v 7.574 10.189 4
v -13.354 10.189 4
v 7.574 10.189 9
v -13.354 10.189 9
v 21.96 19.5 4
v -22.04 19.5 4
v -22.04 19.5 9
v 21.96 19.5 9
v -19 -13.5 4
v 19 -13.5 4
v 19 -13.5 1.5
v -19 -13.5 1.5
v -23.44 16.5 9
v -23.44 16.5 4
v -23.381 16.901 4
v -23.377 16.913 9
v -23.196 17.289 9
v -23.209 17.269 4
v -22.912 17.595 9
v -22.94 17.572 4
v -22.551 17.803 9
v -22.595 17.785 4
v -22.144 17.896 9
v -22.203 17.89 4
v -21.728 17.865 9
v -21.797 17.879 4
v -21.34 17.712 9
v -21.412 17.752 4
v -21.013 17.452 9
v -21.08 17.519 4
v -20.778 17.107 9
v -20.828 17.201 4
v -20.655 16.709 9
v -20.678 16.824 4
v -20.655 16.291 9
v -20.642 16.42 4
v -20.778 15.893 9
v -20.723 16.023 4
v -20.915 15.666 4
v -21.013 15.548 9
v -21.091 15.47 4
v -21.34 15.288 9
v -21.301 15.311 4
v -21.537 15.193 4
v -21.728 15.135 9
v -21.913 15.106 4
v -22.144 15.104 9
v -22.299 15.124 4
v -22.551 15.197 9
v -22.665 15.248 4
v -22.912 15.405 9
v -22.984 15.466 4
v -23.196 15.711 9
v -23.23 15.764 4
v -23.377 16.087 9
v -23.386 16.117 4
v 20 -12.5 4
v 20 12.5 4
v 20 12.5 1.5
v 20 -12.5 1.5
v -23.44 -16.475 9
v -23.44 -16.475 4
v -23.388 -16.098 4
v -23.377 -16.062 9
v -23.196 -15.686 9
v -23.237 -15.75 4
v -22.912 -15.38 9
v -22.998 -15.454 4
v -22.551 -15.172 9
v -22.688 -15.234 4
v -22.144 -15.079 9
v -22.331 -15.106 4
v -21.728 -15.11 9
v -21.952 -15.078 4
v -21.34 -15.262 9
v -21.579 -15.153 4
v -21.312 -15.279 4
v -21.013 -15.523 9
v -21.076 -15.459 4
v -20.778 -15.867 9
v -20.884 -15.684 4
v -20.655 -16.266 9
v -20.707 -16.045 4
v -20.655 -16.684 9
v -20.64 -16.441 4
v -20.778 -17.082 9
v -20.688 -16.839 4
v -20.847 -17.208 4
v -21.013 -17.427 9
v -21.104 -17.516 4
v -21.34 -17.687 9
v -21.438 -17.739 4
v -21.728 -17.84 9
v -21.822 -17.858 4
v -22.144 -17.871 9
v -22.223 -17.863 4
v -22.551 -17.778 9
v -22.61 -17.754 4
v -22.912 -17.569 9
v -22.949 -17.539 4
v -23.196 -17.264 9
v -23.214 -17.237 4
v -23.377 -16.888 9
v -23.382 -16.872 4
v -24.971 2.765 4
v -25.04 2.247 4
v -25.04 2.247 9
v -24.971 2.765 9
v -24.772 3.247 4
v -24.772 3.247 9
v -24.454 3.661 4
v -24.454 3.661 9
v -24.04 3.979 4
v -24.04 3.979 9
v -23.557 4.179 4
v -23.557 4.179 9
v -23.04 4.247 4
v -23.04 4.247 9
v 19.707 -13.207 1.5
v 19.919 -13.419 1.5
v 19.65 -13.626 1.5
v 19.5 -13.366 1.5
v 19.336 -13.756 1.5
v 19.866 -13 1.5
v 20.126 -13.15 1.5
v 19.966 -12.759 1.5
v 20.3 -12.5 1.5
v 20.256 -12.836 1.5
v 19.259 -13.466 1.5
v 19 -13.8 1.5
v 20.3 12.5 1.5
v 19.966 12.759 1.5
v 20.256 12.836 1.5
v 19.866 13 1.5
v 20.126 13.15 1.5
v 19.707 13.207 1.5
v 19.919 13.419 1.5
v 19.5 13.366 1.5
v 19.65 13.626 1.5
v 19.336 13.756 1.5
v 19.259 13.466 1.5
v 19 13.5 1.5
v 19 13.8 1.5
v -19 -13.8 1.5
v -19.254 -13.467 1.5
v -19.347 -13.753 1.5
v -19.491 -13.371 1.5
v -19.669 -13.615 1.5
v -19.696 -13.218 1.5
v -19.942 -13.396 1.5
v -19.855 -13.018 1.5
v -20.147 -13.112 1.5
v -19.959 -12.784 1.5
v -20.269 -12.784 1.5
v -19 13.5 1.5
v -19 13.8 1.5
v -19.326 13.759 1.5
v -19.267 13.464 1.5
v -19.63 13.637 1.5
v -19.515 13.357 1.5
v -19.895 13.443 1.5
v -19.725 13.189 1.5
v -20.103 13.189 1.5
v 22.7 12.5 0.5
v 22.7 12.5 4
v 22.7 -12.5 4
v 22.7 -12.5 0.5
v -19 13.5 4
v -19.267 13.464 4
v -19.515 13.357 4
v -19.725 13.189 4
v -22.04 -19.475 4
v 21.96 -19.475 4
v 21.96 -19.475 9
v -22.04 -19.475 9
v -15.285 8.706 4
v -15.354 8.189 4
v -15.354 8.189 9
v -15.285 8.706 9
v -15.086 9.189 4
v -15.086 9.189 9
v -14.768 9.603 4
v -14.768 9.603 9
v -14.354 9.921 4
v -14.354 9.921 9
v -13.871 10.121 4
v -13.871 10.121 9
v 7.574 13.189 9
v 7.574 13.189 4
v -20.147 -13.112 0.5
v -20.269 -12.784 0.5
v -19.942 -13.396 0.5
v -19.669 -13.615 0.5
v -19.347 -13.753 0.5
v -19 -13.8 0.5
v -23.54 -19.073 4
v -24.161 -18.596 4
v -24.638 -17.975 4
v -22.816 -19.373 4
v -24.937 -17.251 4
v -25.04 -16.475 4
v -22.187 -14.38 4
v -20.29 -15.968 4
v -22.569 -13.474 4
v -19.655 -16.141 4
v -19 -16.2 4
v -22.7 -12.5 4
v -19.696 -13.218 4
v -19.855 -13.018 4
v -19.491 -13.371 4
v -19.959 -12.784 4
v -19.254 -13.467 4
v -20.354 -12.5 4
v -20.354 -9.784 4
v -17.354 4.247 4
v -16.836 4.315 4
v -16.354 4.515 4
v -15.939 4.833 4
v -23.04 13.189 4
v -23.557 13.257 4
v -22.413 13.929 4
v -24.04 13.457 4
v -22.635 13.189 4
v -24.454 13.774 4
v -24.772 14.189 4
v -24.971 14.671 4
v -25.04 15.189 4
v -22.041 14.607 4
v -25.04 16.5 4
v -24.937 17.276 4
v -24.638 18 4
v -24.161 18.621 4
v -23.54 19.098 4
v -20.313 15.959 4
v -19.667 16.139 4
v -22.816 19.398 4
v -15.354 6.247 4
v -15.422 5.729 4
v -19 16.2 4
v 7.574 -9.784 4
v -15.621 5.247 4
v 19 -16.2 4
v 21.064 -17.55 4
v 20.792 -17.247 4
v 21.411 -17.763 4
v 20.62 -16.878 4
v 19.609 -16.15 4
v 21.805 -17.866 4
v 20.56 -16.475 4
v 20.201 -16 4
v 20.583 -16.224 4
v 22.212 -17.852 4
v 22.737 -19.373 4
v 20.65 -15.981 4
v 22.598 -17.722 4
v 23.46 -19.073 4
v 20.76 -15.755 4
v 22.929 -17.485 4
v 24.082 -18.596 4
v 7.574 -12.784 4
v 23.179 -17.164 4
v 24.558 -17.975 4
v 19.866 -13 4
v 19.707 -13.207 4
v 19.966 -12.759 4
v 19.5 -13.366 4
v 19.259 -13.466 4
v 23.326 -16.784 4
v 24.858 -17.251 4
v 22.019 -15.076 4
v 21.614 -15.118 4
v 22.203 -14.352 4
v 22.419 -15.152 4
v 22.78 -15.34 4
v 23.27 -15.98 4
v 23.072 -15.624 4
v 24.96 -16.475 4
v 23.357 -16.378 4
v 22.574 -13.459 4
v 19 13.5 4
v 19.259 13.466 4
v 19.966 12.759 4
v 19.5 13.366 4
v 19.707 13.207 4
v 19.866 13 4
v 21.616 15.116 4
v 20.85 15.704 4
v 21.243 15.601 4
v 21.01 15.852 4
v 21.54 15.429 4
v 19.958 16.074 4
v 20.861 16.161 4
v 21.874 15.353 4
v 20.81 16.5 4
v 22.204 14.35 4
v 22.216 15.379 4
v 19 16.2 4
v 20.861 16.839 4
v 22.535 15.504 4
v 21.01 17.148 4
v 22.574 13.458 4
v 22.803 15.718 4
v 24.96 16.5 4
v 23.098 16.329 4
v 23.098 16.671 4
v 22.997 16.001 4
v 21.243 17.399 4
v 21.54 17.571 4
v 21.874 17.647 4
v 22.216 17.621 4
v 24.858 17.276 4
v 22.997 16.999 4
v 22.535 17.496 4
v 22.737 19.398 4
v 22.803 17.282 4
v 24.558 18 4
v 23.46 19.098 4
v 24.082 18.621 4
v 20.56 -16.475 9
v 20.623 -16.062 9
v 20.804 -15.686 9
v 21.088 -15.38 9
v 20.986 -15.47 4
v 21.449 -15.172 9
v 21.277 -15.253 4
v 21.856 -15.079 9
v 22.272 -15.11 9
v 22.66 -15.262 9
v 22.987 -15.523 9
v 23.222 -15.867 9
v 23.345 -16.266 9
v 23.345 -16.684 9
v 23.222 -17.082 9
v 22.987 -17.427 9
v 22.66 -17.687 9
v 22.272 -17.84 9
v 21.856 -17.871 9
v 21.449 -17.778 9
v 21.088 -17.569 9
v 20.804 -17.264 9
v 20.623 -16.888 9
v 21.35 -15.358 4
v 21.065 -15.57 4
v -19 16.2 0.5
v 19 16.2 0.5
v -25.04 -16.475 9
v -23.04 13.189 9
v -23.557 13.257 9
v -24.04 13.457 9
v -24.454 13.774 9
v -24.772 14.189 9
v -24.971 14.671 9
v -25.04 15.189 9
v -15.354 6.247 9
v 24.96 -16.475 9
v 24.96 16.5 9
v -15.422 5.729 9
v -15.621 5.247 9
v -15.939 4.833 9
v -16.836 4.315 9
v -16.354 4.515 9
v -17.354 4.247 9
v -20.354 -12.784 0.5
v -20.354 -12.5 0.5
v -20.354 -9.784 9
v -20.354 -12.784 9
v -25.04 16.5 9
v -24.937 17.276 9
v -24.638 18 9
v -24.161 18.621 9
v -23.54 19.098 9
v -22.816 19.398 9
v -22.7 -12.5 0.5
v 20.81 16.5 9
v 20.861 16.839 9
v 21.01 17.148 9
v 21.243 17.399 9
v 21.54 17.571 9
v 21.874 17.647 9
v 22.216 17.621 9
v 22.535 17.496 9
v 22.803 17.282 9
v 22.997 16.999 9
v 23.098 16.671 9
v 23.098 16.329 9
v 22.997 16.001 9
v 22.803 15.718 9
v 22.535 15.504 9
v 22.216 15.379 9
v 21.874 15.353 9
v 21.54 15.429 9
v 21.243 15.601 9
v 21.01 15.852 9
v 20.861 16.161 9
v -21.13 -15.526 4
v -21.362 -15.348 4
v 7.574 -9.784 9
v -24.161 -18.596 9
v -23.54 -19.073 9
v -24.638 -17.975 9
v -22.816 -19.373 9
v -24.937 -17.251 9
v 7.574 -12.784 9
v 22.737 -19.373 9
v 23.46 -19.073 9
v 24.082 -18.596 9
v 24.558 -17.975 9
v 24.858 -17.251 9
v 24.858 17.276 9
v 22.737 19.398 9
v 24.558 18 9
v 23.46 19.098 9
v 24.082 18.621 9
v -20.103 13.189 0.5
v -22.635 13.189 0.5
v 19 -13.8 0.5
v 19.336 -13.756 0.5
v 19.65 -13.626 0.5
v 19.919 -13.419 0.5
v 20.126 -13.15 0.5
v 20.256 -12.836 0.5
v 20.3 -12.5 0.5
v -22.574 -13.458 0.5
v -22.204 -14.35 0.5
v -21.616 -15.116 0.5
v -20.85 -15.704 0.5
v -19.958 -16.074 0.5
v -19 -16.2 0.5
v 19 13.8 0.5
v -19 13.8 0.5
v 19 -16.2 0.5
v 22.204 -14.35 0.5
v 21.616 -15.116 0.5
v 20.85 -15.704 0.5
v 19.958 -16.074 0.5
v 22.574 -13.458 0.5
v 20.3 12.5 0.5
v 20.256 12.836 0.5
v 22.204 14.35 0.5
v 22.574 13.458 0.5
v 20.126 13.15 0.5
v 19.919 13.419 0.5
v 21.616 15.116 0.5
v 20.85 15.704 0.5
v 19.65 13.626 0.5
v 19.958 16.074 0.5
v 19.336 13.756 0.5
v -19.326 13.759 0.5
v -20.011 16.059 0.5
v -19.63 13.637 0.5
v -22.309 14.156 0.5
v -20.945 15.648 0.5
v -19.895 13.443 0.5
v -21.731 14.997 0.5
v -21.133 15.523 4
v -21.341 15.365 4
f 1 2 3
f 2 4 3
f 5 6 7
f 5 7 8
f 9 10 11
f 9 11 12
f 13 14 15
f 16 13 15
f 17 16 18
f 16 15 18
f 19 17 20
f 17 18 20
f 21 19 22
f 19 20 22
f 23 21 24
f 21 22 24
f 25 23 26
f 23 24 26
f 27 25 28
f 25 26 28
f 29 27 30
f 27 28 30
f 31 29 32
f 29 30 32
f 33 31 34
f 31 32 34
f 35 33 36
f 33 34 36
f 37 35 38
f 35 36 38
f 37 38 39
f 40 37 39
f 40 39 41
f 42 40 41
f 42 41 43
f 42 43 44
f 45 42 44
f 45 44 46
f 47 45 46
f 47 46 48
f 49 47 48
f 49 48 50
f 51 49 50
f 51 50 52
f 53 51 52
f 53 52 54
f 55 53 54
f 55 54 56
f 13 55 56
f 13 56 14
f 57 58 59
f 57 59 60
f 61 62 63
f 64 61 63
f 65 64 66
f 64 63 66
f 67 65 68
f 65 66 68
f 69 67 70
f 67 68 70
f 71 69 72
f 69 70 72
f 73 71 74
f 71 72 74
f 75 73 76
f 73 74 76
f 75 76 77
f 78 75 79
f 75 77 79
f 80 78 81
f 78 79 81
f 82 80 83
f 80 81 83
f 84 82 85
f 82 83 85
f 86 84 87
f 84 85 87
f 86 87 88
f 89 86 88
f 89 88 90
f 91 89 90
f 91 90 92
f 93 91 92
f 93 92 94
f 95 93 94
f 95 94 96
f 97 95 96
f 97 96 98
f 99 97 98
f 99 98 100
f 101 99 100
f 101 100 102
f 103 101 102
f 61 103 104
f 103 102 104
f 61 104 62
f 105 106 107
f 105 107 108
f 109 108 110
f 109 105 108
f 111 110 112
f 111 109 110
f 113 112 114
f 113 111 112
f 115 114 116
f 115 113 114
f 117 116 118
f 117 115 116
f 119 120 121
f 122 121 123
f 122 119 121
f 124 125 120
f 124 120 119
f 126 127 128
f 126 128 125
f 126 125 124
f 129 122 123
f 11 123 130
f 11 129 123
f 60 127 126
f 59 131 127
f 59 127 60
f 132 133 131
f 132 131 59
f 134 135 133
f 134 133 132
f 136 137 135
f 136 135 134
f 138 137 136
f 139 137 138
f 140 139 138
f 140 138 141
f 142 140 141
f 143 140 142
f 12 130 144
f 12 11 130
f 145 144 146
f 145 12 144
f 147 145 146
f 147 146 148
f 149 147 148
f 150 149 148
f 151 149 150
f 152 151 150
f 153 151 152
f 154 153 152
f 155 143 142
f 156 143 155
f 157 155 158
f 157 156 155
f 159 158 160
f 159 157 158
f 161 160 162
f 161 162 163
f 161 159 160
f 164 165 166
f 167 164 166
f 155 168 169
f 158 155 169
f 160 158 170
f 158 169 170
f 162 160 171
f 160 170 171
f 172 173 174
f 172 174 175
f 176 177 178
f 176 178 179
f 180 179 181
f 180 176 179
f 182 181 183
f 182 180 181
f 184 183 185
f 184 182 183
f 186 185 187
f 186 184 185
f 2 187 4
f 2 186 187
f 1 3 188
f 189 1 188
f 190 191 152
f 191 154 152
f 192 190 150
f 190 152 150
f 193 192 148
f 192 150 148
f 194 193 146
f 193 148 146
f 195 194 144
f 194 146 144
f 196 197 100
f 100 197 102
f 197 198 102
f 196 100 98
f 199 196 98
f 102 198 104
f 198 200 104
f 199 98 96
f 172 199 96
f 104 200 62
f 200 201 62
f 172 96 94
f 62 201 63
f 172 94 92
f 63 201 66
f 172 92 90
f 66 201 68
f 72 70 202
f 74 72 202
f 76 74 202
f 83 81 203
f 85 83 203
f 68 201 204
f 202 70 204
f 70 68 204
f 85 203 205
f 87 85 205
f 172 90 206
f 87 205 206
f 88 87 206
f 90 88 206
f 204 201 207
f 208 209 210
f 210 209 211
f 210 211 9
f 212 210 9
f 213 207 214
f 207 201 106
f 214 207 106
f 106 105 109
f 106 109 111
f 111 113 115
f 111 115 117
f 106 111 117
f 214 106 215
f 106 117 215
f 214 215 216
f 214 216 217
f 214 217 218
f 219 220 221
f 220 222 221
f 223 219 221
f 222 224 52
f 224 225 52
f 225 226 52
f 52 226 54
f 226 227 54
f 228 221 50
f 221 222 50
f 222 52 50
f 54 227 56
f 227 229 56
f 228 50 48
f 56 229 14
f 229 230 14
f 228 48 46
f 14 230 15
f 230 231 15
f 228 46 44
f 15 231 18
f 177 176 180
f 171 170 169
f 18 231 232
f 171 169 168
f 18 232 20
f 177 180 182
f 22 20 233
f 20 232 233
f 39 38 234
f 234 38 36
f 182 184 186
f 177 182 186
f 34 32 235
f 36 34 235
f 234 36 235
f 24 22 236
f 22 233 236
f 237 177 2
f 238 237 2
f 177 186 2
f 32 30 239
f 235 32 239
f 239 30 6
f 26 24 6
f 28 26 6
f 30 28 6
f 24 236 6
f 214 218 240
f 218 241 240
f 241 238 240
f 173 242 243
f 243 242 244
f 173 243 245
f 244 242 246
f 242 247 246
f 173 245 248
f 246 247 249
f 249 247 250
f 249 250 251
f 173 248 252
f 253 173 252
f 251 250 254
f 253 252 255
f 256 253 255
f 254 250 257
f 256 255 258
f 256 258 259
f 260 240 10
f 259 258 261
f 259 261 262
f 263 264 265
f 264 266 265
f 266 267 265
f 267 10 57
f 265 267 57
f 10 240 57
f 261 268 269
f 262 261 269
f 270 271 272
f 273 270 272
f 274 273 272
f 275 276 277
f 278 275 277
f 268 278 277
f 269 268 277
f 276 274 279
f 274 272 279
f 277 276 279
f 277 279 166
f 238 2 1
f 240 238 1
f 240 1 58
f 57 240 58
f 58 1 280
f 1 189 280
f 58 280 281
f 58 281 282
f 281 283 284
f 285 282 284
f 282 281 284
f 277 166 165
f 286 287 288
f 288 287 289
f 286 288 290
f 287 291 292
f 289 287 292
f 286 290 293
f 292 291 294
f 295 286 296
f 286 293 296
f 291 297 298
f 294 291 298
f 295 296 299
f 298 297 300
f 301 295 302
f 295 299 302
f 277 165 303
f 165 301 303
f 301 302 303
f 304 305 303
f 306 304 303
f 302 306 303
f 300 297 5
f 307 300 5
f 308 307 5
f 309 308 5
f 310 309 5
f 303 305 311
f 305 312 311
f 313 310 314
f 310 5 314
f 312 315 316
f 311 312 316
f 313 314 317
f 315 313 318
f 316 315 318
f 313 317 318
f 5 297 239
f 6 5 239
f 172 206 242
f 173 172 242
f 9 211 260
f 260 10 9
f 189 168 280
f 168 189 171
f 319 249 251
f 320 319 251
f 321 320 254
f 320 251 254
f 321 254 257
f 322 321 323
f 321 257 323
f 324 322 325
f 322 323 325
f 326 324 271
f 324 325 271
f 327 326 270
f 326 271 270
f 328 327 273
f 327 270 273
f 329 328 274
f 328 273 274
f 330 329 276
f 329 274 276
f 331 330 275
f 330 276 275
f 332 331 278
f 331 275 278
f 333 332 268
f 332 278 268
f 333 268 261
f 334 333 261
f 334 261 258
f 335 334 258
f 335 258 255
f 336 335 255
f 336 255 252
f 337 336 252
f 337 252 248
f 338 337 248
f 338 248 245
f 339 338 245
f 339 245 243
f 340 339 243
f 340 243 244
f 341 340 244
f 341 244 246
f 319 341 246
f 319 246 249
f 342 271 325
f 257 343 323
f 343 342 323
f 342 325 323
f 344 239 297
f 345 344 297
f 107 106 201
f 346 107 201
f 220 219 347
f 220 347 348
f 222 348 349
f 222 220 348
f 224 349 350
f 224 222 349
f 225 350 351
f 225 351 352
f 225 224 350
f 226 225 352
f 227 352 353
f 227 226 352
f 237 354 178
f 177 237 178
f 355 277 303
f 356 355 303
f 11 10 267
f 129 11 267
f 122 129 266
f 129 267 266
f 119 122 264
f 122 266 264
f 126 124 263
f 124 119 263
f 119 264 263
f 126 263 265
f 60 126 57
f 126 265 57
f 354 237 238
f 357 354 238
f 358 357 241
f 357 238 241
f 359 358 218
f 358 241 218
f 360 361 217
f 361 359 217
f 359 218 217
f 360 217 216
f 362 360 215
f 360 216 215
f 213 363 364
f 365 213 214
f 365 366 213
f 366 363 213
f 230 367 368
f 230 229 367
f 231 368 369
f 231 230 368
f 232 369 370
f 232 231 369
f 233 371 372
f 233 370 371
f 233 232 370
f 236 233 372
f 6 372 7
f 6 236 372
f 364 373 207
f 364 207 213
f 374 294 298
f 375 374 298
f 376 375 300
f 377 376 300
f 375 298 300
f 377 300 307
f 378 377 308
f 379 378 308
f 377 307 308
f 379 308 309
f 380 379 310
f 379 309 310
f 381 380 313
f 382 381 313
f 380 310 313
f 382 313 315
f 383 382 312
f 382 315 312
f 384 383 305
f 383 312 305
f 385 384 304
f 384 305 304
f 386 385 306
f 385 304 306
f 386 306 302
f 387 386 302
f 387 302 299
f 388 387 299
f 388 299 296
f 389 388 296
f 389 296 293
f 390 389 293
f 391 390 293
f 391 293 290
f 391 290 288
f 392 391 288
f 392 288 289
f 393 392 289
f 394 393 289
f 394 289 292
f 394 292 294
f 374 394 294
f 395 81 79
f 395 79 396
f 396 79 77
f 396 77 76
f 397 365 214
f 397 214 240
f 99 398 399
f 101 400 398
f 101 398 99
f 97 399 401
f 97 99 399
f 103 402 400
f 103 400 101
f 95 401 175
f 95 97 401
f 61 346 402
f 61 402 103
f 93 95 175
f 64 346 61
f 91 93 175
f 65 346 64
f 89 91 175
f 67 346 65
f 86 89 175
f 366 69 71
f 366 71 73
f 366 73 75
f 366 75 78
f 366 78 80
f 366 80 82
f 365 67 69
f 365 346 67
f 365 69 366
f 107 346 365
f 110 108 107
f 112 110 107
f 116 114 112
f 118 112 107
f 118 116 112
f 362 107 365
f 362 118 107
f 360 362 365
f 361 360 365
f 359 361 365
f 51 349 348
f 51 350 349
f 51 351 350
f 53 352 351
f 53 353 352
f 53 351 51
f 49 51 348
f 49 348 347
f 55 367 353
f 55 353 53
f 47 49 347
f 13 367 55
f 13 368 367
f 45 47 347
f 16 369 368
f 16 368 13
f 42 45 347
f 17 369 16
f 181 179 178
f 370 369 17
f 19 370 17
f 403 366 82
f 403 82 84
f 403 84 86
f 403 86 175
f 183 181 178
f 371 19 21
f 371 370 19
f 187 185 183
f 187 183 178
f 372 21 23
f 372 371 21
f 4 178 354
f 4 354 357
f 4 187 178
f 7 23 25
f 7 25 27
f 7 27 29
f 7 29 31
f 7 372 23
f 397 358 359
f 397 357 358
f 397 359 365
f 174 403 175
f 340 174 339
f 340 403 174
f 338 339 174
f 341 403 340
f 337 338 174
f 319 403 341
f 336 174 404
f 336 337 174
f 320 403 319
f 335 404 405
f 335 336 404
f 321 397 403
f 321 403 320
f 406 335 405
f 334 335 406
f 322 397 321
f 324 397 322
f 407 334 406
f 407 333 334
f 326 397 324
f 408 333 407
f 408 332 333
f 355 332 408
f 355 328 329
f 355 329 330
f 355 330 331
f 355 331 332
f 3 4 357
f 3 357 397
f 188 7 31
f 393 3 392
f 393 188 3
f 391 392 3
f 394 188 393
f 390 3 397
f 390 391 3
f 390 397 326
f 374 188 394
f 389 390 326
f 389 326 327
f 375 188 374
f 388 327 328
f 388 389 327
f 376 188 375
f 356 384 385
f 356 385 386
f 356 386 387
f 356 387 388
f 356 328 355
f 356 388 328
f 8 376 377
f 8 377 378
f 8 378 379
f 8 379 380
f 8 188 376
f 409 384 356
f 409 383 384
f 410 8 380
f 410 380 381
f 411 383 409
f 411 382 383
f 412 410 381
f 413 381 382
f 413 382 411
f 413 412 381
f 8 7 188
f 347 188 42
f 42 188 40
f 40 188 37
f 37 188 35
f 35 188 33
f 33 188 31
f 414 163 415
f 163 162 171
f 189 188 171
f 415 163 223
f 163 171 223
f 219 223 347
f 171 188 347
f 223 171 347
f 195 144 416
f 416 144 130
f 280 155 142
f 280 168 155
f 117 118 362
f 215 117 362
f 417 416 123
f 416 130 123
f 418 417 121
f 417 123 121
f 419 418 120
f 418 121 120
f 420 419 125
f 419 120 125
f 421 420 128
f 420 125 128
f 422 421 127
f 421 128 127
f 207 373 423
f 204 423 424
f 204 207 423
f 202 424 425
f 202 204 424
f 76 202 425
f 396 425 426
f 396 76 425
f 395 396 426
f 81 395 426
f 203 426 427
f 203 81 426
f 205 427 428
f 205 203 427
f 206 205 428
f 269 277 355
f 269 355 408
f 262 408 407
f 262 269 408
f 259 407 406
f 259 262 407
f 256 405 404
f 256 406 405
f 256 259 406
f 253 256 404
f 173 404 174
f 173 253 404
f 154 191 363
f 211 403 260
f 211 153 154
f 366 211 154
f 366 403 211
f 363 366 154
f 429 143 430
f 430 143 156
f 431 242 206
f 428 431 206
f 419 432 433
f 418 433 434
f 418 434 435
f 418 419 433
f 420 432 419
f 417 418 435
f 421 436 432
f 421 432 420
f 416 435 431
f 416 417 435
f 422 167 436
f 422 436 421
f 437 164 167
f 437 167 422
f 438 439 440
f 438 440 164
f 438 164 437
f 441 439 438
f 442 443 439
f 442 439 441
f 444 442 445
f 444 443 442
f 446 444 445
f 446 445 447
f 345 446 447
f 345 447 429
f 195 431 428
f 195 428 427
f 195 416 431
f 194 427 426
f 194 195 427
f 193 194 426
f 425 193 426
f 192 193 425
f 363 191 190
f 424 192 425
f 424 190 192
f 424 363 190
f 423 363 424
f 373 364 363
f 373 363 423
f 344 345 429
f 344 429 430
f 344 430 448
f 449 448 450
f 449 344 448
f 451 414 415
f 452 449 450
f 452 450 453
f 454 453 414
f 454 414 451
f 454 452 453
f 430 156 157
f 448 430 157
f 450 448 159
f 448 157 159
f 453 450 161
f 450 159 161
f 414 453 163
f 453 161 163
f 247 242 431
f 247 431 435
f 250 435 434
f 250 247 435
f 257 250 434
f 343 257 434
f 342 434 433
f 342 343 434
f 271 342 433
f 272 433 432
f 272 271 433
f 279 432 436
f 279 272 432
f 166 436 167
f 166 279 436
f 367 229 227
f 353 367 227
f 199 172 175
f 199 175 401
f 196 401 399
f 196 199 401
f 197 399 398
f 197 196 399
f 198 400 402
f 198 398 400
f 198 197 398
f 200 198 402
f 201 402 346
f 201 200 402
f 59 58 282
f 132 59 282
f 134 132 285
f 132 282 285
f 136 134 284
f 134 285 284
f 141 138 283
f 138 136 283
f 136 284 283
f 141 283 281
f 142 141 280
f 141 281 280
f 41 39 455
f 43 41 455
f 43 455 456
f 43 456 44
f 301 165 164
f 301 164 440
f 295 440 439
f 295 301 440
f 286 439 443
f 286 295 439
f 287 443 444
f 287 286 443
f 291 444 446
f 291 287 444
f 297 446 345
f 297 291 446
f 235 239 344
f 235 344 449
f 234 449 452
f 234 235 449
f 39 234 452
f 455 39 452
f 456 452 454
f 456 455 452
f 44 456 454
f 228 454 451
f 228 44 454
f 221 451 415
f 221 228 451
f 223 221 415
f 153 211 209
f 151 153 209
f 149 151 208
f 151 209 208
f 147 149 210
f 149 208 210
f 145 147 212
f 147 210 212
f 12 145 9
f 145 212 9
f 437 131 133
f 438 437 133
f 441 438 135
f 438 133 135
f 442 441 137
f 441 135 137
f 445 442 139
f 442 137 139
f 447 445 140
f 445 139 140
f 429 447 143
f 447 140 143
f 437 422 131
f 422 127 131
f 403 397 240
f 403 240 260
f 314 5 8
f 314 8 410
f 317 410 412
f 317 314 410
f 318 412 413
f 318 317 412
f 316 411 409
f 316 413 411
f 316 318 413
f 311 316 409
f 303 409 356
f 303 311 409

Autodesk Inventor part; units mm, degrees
ref_plane "YZ Plane" through (0, 0, 0) normal (1, 0, 0) x (0, 1, 0)
ref_plane "Arbeitsebene1" through (0, 0, 4) normal (0, 0, 1) x (1, 0, 0)
sketch "Skizze1" plane through (0, 0, 4) normal (0, 0, 1) x (1, 0, 0)
  line L0 (21.8964, 12.5) -> (21.8964, -12.5) construction
  arc A0 (14.8964, -19.5) -> (21.8964, -12.5) centre (14.8964, -12.5) ccw construction
  line L1 (14.8964, -19.5) -> (-23.1036, -19.5) construction
  arc A1 (-30.1036, -12.5) -> (-23.1036, -19.5) centre (-23.1036, -12.5) ccw construction
  line L2 (-30.1036, -12.5) -> (-30.1036, 12.5) construction
  arc A2 (-23.1036, 19.5) -> (-30.1036, 12.5) centre (-23.1036, 12.5) ccw construction
  line L3 (-23.1036, 19.5) -> (14.8964, 19.5) construction
  arc A3 (21.8964, 12.5) -> (14.8964, 19.5) centre (14.8964, 12.5) ccw construction
  line L4 (-26.9233, 19.5) -> (14.8964, 19.5)
  line L5 (14.8964, 19.5) -> (14.8964, -19.4749)
  line L6 (14.8964, -19.4749) -> (-26.9233, -19.4749)
  line L7 (-26.9233, -19.4749) -> (-26.9233, 19.5)
  line L8 (2.5735, 11.7657) -> (-15.3535, 11.7657) construction
  line L9 (2.5735, 13.7657) -> (-15.3535, 13.7657)
  line L10 (-15.3535, 9.7657) -> (2.5735, 9.7657)
  arc A4 (2.5735, 9.7657) -> (2.5735, 13.7657) centre (2.5735, 11.7657) ccw
  arc A5 (-15.3535, 13.7657) -> (-15.3535, 9.7657) centre (-15.3535, 11.7657) ccw
  line L11 (2.4395, -11.3613) -> (-15.3535, -11.3613) construction
  line L12 (2.4395, -9.3613) -> (-15.3535, -9.3613)
  line L13 (-15.3535, -13.3613) -> (2.4395, -13.3613)
  arc A6 (2.4395, -13.3613) -> (2.4395, -9.3613) centre (2.4395, -11.3613) ccw
  arc A7 (-15.3535, -9.3613) -> (-15.3535, -13.3613) centre (-15.3535, -11.3613) ccw
  line L14 (24.9604, -16.4749) -> (24.9604, 19.5) construction
  line L15 (21.9604, 19.5) -> (-22.0396, 19.5) construction
  line L16 (-25.0396, 19.5) -> (-25.0396, -16.4749) construction
  line L17 (-22.0396, -19.4749) -> (24.9604, -19.4749) construction
  line L18 (24.9604, 19.5) -> (14.8964, 19.5)
  line L19 (14.8964, 19.5) -> (14.8964, -19.4749)
  line L20 (14.8964, -19.4749) -> (21.9604, -19.4749)
  line L21 (24.9604, -19.4749) -> (24.9604, 16.5)
  line L22 (-26.9233, 19.5) -> (-25.0396, 19.5)
  line L23 (-25.0396, -19.4749) -> (-26.9233, -19.4749)
  line L24 (-26.9233, -19.4749) -> (-26.9233, 19.5)
  arc A8 (-25.0396, -16.4749) -> (-22.0396, -19.4749) centre (-22.0396, -16.4749) ccw
  arc A9 (-22.0396, 19.5) -> (-25.0396, 16.5) centre (-22.0396, 16.5) ccw
  arc A10 (24.9604, 16.5) -> (21.9604, 19.5) centre (21.9604, 16.5) ccw
  arc A11 (21.9604, -19.4749) -> (24.9604, -16.4749) centre (21.9604, -16.4749) ccw
  line L25 (8.61, 8.7657) -> (-21.39, 8.7657)
  line L26 (-21.39, 8.7657) -> (-21.39, 14.7657)
  line L27 (-21.39, 14.7657) -> (8.61, 14.7657)
  line L28 (8.61, 14.7657) -> (8.61, 8.7657)
  line L29 (8.61, 8.7657) -> (-21.39, 14.7657) construction
  line L30 (-21.39, 8.7657) -> (8.61, 14.7657) construction
  line L31 (8.543, -14.3613) -> (-21.457, -14.3613)
  line L32 (-21.457, -14.3613) -> (-21.457, -8.3613)
  line L33 (-21.457, -8.3613) -> (8.543, -8.3613)
  line L34 (8.543, -8.3613) -> (8.543, -14.3613)
  line L35 (8.543, -14.3613) -> (-21.457, -8.3613) construction
  line L36 (-21.457, -14.3613) -> (8.543, -8.3613) construction
  line L37 (-25.0396, 16.5) -> (-25.0396, -16.4749)
  line L38 (-25.0396, -19.227) -> (-25.0396, -19.4749)
  point P0 (0, 0)
  point P1 (-15.2165, -11.3613)
  point P2 (-6.39, 11.7657)
  point P3 (-6.457, -11.3613)
  point P4 (-24, -18.4749)
  point P5 (33.4901, -16.4749)
  point P6 (-34.4755, 19.5)
  point P7 (-34.4755, -19.4749)
  point P8 (-22.0396, -19.4749)
  dimension "d1" = 4
  dimension "d2" = 4
  dimension "d5" = 3
  dimension "d37" = 30
  dimension "d38" = 6
  dimension "d39" = 6
  dimension "d40" = 30
  dimension "d55" = 50
extrude "Extrusion1" add sketch "Skizze1" along normal blind 5 contours L4 L5 L6 A8 L37 A9 | L18 A10 L21 A11 L20 L5 | A4 L10 A5 L9 | A6 L13 A7 L12 | L25 L26 L27 L28 | L31 L32 L33 L34
sketch "Skizze3" plane through (0, 0, 4) normal (0, 0, -1) x (-1, 0, 0)
  line L0 (22.0396, -19.4749) -> (-21.9604, -19.4749) projected
  line L1 (-21.9604, 19.5) -> (22.0396, 19.5) projected
  arc A0 (-21.9604, 19.5) -> (-24.9604, 16.5) centre (-21.9604, 16.5) ccw projected
  line L2 (-24.9604, -16.4749) -> (-24.9604, 16.5) projected
  circle A1 centre (-21.9604, 16.5) radius 1.15
  circle A2 centre (-21.9604, -16.4749) radius 1.4
  circle A3 centre (22.0396, 16.5) radius 1.4
  circle A4 centre (22.0396, -16.4749) radius 1.4
  arc A5 (-24.9604, -16.4749) -> (-21.9604, -19.4749) centre (-21.9604, -16.4749) ccw projected
  line L3 (25.0396, 16.5) -> (25.0396, -16.4749) projected
  arc A6 (25.0396, 16.5) -> (22.0396, 19.5) centre (22.0396, 16.5) ccw projected
  arc A7 (22.0396, -19.4749) -> (25.0396, -16.4749) centre (22.0396, -16.4749) ccw projected
  point P0 (0, 0)
  dimension "d16" = 2.3
  dimension "d17" = 2.8
  dimension "d18" = 2.8
  dimension "d19" = 2.8
extrude "Extrusion3" cut sketch "Skizze3" against normal blind 10 contours A1 | A2 | A3 | A4
sketch "Skizze9" plane through (0, 0, 4) normal (0, 0, -1) x (-1, 0, 0)
  arc A0 (19, -13.5) -> (20, -12.5) centre (19, -12.5) ccw projected
  line L0 (20, -12.5) -> (20, 12.5) projected
  arc A1 (20, 12.5) -> (19, 13.5) centre (19, 12.5) ccw projected
  line L1 (19, 13.5) -> (-19, 13.5) projected
  arc A2 (-19, 13.5) -> (-20, 12.5) centre (-19, 12.5) ccw projected
  line L2 (-20, 12.5) -> (-20, -12.5) projected
  arc A3 (-20, -12.5) -> (-19, -13.5) centre (-19, -12.5) ccw projected
  line L3 (-19, -13.5) -> (19, -13.5) projected
  line L4 (-19, 13.2) -> (19, 13.2)
  arc A4 (19.7, 12.5) -> (19, 13.2) centre (19, 12.5) ccw
  line L5 (19.7, 12.5) -> (19.7, -12.5)
  arc A5 (19, -13.2) -> (19.7, -12.5) centre (19, -12.5) ccw
  line L6 (19, -13.2) -> (-19, -13.2)
  arc A6 (-19.7, -12.5) -> (-19, -13.2) centre (-19, -12.5) ccw
  line L7 (-19.7, -12.5) -> (-19.7, 12.5)
  arc A7 (-19, 13.2) -> (-19.7, 12.5) centre (-19, 12.5) ccw
  line L8 (19, 16.2) -> (-19, 16.2)
  arc A8 (-19, 16.2) -> (-22.7, 12.5) centre (-19, 12.5) ccw
  line L9 (-22.7, 12.5) -> (-22.7, -12.5)
  arc A9 (-22.7, -12.5) -> (-19, -16.2) centre (-19, -12.5) ccw
  line L10 (-19, -16.2) -> (19, -16.2)
  arc A10 (19, -16.2) -> (22.7, -12.5) centre (19, -12.5) ccw
  line L11 (22.7, -12.5) -> (22.7, 12.5)
  arc A11 (22.7, 12.5) -> (19, 16.2) centre (19, 12.5) ccw
  circle A12 centre (-21.9604, 16.5) radius 1.15 projected
  circle A13 centre (22.0396, 16.5) radius 1.4 projected
  circle A14 centre (22.0396, -16.4749) radius 1.4 projected
  circle A15 centre (-21.9604, -16.4749) radius 1.4 projected
  point P0 (0, 0)
  dimension "d46" = 0.3
  dimension "d47" = 3
ref_plane "Arbeitsebene4" through (-20, -13.5, 1.5) normal (0, 0, 1) x (1, 0, 0)
extrude "Extrusion8" add sketch "Skizze9" along normal up to surface (2.5 mm away) contours A11 A13 L11 A10 A14 L10 A9 A15 L9 A8 L8 | A11 A13 | A15 A9 | A10 A14 picked at (21.2445, 15.3819) picked at (-21.1797, -15.4267) picked at (21.1725, -15.4212)
sketch "Skizze10" plane through (19, 16.2, 1.5) normal (0, 0, -1) x (-1, 0, 0)
  arc A0 (38, -29.7) -> (39, -28.7) centre (38, -28.7) ccw projected
  line L0 (39, -28.7) -> (39, -3.7) projected
  arc A1 (39, -3.7) -> (38, -2.7) centre (38, -3.7) ccw projected
  line L1 (38, -2.7) -> (0, -2.7) projected
  arc A2 (0, -2.7) -> (-1, -3.7) centre (0, -3.7) ccw projected
  line L2 (-1, -3.7) -> (-1, -28.7) projected
  arc A3 (-1, -28.7) -> (0, -29.7) centre (0, -28.7) ccw projected
  line L3 (0, -29.7) -> (38, -29.7) projected
  arc A4 (38, -29.7) -> (39, -28.7) centre (38, -28.7) ccw projected
  line L4 (38, -29.7) -> (0, -29.7) projected
  arc A5 (-1, -28.7) -> (0, -29.7) centre (0, -28.7) ccw projected
  line L5 (-1, -28.7) -> (-1, -3.7) projected
  arc A6 (0, -2.7) -> (-1, -3.7) centre (0, -3.7) ccw projected
  line L6 (0, -2.7) -> (38, -2.7) projected
  arc A7 (39, -3.7) -> (38, -2.7) centre (38, -3.7) ccw projected
  line L7 (39, -3.7) -> (39, -28.7) projected
  line L8 (38, 0) -> (0, 0) projected
  arc A8 (0, 0) -> (-3.7, -3.7) centre (0, -3.7) ccw projected
  line L9 (-3.7, -3.7) -> (-3.7, -28.7) projected
  arc A9 (-3.7, -28.7) -> (0, -32.4) centre (0, -28.7) ccw projected
  line L10 (0, -32.4) -> (38, -32.4) projected
  arc A10 (38, -32.4) -> (41.7, -28.7) centre (38, -28.7) ccw projected
  line L11 (41.7, -28.7) -> (41.7, -3.7) projected
  arc A11 (41.7, -3.7) -> (38, 0) centre (38, -3.7) ccw projected
  line L12 (0, -2.4) -> (38, -2.4)
  arc A12 (39.3, -3.7) -> (38, -2.4) centre (38, -3.7) ccw
  line L13 (39.3, -3.7) -> (39.3, -28.7)
  arc A13 (38, -30) -> (39.3, -28.7) centre (38, -28.7) ccw
  line L14 (38, -30) -> (0, -30)
  arc A14 (-1.3, -28.7) -> (0, -30) centre (0, -28.7) ccw
  line L15 (-1.3, -28.7) -> (-1.3, -3.7)
  arc A15 (0, -2.4) -> (-1.3, -3.7) centre (0, -3.7) ccw
  point P0 (19, -16.2)
  dimension "d50" = 0.3
ref_plane "Arbeitsebene5" through (-20, -13.5, 0.5) normal (0, 0, -1) x (0, 1, 0)
extrude "Extrusion9" add sketch "Skizze10" along normal up to surface (1 mm away) contours A11 L11 A10 L10 A9 L9 A8 L8
sketch "Skizze11" plane through (19, 16.2, 0.5) normal (0, 0, -1) x (-1, 0, 0)
  arc A0 (-1.3, -28.7) -> (0, -30) centre (0, -28.7) ccw projected
  line L0 (-1.3, -3.7) -> (-1.3, -28.7) projected
  arc A1 (0, -2.4) -> (-1.3, -3.7) centre (0, -3.7) ccw projected
  line L1 (38, -2.4) -> (0, -2.4) projected
  arc A2 (39.3, -3.7) -> (38, -2.4) centre (38, -3.7) ccw projected
  line L2 (39.3, -28.7) -> (39.3, -3.7) projected
  arc A3 (38, -30) -> (39.3, -28.7) centre (38, -28.7) ccw projected
  line L3 (0, -30) -> (38, -30) projected
  line L4 (0, 0) -> (38, 0) projected
  arc A4 (0, 0) -> (-3.7, -3.7) centre (0, -3.7) ccw projected
  line L5 (-3.7, -28.7) -> (-3.7, -3.7) projected
  arc A5 (-3.7, -28.7) -> (0, -32.4) centre (0, -28.7) ccw projected
  line L6 (38, -32.4) -> (0, -32.4) projected
  arc A6 (38, -32.4) -> (41.7, -28.7) centre (38, -28.7) ccw projected
  line L7 (41.7, -3.7) -> (41.7, -28.7) projected
  arc A7 (41.7, -3.7) -> (38, 0) centre (38, -3.7) ccw projected
  line L8 (41.7, -3.7) -> (41.7, -28.7) projected
  line L9 (39.3, -28.7) -> (39.3, -3.7) projected
  line L10 (41.7, -28.7) -> (39.3, -28.7)
  line L11 (39.3, -28.7) -> (39.3, -3.7)
  line L12 (39.3, -3.7) -> (41.7, -3.7)
  line L13 (41.7, -3.7) -> (41.7, -28.7)
  line L14 (39.3, -28.7) -> (36.2612, -28.7)
  line L15 (36.2612, -28.7) -> (36.2612, -3.7)
  line L16 (36.2612, -3.7) -> (39.3, -3.7)
  line L17 (39.3, -3.7) -> (39.3, -28.7)
  point P0 (19, -16.2)
extrude "Extrusion10" cut sketch "Skizze11" against normal up to surface (3.5 mm away) contours L14 L15 L16 L2 | L2 L12 L7 L10
sketch "Sketch12" plane through (0, 0, 9) normal (0, 0, 1) x (1, 0, 0)
  circle A0 centre (21.9604, 16.5) radius 1.15 projected
  line L0 (-25.0396, 16.5) -> (-25.0396, -16.4749) projected
  arc A1 (-25.0396, -16.4749) -> (-22.0396, -19.4749) centre (-22.0396, -16.4749) ccw projected
  line L1 (-22.0396, -19.4749) -> (21.9604, -19.4749) projected
  arc A2 (21.9604, -19.4749) -> (24.9604, -16.4749) centre (21.9604, -16.4749) ccw projected
  line L2 (24.9604, -16.4749) -> (24.9604, 16.5) projected
  arc A3 (24.9604, 16.5) -> (21.9604, 19.5) centre (21.9604, 16.5) ccw projected
  line L3 (21.9604, 19.5) -> (-22.0396, 19.5) projected
  arc A4 (-22.0396, 19.5) -> (-25.0396, 16.5) centre (-22.0396, 16.5) ccw projected
  line L4 (7.5735, -12.7843) -> (-20.3535, -12.7843)
  line L5 (-20.3535, -12.7843) -> (-20.3535, -9.7843)
  line L6 (-20.3535, -9.7843) -> (7.5735, -9.7843)
  line L7 (7.5735, -9.7843) -> (7.5735, -12.7843)
  line L8 (-20.3535, 10.1887) -> (7.5735, 10.1887)
  line L9 (7.5735, 10.1887) -> (7.5735, 13.1887)
  line L10 (7.5735, 13.1887) -> (-20.3535, 13.1887)
  line L11 (-20.3535, 13.1887) -> (-20.3535, 10.1887)
  line L12 (-25.0396, 16.5) -> (-25.0396, -16.4749) projected
  line L13 (-15.3535, 10.1887) -> (-25.0396, 10.1887)
  line L14 (-25.0396, 10.1887) -> (-25.0396, 4.2471)
  line L15 (-25.0396, 4.2471) -> (-15.3535, 4.2471)
  line L16 (-15.3535, 4.2471) -> (-15.3535, 10.1887)
  line L17 (-20.3535, 13.1887) -> (-25.0396, 13.1887)
  line L18 (-25.0396, 13.1887) -> (-25.0396, 10.1887)
  line L19 (-25.0396, 10.1887) -> (-20.3535, 10.1887)
  line L20 (-20.3535, 10.1887) -> (-20.3535, 13.1887)
  point P0 (0, 0)
  point P1 (2.4395, -11.2343)
  point P2 (2.5735, 11.6387)
  point P3 (-15.3535, 11.7657)
  dimension "d56" = 3
  dimension "d57" = 3
  dimension "d58" = 1.55
  dimension "d59" = 1.55
  dimension "d60" = 5
  dimension "d61" = 5
extrude "Extrusion11" cut sketch "Sketch12" against normal through all contours L17 L11 L13 L0 | L13 L8 L16 L15 L0 | L10 L9 L8 L11 | L4 L5 L6 L7
fillet "Fillet2" radius 2 4 edges at (-15.3535, 10.1887, 6.5) (-15.3535, 4.2471, 6.5) (-25.0396, 4.2471, 6.5) (-25.0396, 13.1887, 6.5)
sketch "Sketch13" plane through (0, 0, 9) normal (0, 0, 1) x (1, 0, 0)
  point P0 (0, 0)
properties part number "ESP32ParasiteMicroscope_base_v0"
